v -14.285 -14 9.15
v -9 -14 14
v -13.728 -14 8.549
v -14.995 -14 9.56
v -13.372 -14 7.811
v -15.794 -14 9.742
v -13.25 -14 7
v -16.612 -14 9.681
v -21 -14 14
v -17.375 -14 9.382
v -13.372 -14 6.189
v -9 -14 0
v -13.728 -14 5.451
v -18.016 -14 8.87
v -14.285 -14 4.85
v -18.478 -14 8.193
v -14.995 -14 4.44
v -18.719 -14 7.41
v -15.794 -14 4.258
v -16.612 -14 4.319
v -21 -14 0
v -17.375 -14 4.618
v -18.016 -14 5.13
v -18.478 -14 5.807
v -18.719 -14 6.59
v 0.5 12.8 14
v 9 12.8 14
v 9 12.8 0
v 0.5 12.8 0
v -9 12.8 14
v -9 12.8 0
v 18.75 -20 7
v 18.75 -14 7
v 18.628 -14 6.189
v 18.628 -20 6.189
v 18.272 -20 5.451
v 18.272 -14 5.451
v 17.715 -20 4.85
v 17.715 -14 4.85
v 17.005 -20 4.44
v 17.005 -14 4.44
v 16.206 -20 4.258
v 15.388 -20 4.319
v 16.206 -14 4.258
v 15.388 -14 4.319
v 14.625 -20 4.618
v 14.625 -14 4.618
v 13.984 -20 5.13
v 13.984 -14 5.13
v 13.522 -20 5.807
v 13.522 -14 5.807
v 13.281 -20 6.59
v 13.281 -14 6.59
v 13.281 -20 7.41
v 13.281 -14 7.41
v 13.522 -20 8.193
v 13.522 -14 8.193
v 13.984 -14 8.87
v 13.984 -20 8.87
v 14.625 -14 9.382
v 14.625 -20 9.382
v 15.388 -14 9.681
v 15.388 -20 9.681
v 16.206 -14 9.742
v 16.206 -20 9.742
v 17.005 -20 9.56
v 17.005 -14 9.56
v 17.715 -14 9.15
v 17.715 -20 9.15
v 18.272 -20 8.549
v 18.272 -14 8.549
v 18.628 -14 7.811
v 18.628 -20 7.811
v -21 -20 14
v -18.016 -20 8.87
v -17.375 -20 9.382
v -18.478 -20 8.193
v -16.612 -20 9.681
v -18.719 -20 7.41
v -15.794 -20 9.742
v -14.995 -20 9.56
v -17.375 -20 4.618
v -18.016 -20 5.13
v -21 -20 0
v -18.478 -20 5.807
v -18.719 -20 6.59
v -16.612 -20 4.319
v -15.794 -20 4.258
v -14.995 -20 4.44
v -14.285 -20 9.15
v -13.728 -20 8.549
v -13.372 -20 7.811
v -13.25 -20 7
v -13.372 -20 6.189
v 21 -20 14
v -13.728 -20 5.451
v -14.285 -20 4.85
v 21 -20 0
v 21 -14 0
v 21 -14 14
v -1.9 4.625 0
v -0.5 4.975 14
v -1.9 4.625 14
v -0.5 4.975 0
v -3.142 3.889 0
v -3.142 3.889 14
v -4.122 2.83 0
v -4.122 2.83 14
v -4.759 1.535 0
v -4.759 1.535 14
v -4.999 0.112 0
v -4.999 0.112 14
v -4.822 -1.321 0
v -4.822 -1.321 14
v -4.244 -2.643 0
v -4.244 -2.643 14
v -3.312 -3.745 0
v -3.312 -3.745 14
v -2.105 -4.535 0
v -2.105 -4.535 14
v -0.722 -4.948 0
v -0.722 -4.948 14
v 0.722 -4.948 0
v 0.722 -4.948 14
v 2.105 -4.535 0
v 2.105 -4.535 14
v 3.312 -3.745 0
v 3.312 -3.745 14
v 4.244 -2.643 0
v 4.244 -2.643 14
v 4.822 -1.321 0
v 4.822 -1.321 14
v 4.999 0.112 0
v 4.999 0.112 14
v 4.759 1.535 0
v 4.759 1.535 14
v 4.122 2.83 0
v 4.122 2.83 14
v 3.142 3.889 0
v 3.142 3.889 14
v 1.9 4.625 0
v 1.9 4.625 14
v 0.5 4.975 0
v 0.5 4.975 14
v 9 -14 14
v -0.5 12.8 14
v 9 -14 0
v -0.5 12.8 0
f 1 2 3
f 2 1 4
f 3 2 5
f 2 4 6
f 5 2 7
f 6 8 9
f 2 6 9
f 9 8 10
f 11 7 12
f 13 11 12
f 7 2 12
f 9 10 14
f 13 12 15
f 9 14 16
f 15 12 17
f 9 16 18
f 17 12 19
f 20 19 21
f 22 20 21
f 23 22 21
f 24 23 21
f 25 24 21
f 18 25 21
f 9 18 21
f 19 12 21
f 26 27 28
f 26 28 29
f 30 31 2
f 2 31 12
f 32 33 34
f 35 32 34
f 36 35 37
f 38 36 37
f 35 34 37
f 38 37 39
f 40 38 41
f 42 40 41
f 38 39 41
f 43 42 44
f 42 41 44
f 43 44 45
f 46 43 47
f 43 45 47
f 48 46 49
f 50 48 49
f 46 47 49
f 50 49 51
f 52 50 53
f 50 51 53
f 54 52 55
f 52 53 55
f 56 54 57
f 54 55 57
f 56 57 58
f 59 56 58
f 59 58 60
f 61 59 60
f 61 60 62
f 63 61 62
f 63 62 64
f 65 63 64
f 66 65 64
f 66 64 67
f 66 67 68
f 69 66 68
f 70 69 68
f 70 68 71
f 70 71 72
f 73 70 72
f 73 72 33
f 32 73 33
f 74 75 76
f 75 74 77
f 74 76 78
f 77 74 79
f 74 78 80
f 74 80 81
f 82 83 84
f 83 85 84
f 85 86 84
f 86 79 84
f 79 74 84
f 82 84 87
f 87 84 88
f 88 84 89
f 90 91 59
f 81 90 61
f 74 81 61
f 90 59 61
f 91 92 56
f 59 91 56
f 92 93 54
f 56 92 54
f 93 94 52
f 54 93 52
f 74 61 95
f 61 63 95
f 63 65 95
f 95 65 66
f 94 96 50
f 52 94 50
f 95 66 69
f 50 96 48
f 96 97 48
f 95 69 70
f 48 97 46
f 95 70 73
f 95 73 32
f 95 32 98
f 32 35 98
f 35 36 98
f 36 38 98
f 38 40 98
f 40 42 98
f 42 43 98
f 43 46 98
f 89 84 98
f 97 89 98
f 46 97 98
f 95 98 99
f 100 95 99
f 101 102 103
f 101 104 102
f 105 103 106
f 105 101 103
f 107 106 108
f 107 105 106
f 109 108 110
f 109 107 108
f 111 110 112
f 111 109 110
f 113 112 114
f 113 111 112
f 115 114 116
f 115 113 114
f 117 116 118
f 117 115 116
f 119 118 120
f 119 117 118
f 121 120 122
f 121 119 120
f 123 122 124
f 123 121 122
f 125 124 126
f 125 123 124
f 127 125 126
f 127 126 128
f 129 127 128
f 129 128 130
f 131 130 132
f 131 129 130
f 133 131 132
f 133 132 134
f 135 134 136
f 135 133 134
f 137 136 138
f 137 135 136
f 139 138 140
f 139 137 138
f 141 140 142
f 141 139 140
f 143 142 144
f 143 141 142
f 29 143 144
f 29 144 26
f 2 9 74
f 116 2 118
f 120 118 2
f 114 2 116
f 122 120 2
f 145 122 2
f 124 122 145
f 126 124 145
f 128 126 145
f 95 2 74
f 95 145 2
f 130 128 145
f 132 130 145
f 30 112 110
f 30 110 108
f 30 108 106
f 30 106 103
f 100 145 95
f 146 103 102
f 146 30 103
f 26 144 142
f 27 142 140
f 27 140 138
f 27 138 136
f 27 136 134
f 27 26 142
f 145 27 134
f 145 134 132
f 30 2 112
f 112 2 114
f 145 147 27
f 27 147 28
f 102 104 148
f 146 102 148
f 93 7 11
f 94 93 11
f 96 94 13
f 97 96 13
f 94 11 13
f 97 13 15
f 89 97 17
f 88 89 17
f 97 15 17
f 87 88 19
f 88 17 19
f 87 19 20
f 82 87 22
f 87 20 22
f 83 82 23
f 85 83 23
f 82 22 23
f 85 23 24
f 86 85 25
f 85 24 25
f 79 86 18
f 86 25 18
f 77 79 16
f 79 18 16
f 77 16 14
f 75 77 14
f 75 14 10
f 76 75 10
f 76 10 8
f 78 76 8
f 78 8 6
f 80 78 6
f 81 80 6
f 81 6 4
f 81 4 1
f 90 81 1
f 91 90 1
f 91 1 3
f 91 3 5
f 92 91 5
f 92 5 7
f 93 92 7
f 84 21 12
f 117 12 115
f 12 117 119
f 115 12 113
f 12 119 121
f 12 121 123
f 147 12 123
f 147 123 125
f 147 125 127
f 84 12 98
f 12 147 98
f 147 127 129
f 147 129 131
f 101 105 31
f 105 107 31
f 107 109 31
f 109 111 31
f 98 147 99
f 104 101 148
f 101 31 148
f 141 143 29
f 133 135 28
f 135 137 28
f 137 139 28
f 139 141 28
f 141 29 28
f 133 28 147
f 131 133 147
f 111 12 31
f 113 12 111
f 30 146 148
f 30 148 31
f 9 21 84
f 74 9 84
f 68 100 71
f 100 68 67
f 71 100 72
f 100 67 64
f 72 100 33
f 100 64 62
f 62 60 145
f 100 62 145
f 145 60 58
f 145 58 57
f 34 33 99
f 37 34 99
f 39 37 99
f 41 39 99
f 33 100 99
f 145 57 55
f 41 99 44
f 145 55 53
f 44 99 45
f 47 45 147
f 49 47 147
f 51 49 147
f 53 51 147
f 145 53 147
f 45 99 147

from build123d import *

# Parameters (mm, degrees)
SKETCH1_R           = 5
BOSS_EXTRUDE1_DEPTH = 14
SKETCH2_W           = 1
SKETCH2_H           = 15.34768378
CUT_EXTRUDE1_DEPTH  = 15
SKETCH3_R           = 2.75
CUT_EXTRUDE2_DEPTH  = 7


with BuildPart() as part:
    # Sketch1 → Boss-Extrude1 (new body)
    with BuildSketch(Plane.XY):
        Polygon((9, 12.8), (-9, 12.8), (-9, -14), (-21, -14), (-21, -20), (21, -20), (21, -14), (9, -14), align=None)
        Circle(SKETCH1_R, mode=Mode.SUBTRACT)
    extrude(amount=BOSS_EXTRUDE1_DEPTH)

    # Sketch2 → Cut-Extrude1 (cut, through all)
    with BuildSketch(Plane.XY.offset(14)):
        with Locations((0, 7.003057882)):
            Rectangle(SKETCH2_W, SKETCH2_H)
    extrude(amount=-CUT_EXTRUDE1_DEPTH, mode=Mode.SUBTRACT)

    # Sketch3 → Cut-Extrude2 (cut, through all)
    with BuildSketch(Plane(origin=(0, -14, 0), x_dir=(1, 0, 0), z_dir=(0, 1, 0))):
        with Locations((-16, -7)):
            Circle(SKETCH3_R)
        with Locations((16, -7)):
            Circle(SKETCH3_R)
    extrude(amount=-CUT_EXTRUDE2_DEPTH, mode=Mode.SUBTRACT)


solid = part.part
